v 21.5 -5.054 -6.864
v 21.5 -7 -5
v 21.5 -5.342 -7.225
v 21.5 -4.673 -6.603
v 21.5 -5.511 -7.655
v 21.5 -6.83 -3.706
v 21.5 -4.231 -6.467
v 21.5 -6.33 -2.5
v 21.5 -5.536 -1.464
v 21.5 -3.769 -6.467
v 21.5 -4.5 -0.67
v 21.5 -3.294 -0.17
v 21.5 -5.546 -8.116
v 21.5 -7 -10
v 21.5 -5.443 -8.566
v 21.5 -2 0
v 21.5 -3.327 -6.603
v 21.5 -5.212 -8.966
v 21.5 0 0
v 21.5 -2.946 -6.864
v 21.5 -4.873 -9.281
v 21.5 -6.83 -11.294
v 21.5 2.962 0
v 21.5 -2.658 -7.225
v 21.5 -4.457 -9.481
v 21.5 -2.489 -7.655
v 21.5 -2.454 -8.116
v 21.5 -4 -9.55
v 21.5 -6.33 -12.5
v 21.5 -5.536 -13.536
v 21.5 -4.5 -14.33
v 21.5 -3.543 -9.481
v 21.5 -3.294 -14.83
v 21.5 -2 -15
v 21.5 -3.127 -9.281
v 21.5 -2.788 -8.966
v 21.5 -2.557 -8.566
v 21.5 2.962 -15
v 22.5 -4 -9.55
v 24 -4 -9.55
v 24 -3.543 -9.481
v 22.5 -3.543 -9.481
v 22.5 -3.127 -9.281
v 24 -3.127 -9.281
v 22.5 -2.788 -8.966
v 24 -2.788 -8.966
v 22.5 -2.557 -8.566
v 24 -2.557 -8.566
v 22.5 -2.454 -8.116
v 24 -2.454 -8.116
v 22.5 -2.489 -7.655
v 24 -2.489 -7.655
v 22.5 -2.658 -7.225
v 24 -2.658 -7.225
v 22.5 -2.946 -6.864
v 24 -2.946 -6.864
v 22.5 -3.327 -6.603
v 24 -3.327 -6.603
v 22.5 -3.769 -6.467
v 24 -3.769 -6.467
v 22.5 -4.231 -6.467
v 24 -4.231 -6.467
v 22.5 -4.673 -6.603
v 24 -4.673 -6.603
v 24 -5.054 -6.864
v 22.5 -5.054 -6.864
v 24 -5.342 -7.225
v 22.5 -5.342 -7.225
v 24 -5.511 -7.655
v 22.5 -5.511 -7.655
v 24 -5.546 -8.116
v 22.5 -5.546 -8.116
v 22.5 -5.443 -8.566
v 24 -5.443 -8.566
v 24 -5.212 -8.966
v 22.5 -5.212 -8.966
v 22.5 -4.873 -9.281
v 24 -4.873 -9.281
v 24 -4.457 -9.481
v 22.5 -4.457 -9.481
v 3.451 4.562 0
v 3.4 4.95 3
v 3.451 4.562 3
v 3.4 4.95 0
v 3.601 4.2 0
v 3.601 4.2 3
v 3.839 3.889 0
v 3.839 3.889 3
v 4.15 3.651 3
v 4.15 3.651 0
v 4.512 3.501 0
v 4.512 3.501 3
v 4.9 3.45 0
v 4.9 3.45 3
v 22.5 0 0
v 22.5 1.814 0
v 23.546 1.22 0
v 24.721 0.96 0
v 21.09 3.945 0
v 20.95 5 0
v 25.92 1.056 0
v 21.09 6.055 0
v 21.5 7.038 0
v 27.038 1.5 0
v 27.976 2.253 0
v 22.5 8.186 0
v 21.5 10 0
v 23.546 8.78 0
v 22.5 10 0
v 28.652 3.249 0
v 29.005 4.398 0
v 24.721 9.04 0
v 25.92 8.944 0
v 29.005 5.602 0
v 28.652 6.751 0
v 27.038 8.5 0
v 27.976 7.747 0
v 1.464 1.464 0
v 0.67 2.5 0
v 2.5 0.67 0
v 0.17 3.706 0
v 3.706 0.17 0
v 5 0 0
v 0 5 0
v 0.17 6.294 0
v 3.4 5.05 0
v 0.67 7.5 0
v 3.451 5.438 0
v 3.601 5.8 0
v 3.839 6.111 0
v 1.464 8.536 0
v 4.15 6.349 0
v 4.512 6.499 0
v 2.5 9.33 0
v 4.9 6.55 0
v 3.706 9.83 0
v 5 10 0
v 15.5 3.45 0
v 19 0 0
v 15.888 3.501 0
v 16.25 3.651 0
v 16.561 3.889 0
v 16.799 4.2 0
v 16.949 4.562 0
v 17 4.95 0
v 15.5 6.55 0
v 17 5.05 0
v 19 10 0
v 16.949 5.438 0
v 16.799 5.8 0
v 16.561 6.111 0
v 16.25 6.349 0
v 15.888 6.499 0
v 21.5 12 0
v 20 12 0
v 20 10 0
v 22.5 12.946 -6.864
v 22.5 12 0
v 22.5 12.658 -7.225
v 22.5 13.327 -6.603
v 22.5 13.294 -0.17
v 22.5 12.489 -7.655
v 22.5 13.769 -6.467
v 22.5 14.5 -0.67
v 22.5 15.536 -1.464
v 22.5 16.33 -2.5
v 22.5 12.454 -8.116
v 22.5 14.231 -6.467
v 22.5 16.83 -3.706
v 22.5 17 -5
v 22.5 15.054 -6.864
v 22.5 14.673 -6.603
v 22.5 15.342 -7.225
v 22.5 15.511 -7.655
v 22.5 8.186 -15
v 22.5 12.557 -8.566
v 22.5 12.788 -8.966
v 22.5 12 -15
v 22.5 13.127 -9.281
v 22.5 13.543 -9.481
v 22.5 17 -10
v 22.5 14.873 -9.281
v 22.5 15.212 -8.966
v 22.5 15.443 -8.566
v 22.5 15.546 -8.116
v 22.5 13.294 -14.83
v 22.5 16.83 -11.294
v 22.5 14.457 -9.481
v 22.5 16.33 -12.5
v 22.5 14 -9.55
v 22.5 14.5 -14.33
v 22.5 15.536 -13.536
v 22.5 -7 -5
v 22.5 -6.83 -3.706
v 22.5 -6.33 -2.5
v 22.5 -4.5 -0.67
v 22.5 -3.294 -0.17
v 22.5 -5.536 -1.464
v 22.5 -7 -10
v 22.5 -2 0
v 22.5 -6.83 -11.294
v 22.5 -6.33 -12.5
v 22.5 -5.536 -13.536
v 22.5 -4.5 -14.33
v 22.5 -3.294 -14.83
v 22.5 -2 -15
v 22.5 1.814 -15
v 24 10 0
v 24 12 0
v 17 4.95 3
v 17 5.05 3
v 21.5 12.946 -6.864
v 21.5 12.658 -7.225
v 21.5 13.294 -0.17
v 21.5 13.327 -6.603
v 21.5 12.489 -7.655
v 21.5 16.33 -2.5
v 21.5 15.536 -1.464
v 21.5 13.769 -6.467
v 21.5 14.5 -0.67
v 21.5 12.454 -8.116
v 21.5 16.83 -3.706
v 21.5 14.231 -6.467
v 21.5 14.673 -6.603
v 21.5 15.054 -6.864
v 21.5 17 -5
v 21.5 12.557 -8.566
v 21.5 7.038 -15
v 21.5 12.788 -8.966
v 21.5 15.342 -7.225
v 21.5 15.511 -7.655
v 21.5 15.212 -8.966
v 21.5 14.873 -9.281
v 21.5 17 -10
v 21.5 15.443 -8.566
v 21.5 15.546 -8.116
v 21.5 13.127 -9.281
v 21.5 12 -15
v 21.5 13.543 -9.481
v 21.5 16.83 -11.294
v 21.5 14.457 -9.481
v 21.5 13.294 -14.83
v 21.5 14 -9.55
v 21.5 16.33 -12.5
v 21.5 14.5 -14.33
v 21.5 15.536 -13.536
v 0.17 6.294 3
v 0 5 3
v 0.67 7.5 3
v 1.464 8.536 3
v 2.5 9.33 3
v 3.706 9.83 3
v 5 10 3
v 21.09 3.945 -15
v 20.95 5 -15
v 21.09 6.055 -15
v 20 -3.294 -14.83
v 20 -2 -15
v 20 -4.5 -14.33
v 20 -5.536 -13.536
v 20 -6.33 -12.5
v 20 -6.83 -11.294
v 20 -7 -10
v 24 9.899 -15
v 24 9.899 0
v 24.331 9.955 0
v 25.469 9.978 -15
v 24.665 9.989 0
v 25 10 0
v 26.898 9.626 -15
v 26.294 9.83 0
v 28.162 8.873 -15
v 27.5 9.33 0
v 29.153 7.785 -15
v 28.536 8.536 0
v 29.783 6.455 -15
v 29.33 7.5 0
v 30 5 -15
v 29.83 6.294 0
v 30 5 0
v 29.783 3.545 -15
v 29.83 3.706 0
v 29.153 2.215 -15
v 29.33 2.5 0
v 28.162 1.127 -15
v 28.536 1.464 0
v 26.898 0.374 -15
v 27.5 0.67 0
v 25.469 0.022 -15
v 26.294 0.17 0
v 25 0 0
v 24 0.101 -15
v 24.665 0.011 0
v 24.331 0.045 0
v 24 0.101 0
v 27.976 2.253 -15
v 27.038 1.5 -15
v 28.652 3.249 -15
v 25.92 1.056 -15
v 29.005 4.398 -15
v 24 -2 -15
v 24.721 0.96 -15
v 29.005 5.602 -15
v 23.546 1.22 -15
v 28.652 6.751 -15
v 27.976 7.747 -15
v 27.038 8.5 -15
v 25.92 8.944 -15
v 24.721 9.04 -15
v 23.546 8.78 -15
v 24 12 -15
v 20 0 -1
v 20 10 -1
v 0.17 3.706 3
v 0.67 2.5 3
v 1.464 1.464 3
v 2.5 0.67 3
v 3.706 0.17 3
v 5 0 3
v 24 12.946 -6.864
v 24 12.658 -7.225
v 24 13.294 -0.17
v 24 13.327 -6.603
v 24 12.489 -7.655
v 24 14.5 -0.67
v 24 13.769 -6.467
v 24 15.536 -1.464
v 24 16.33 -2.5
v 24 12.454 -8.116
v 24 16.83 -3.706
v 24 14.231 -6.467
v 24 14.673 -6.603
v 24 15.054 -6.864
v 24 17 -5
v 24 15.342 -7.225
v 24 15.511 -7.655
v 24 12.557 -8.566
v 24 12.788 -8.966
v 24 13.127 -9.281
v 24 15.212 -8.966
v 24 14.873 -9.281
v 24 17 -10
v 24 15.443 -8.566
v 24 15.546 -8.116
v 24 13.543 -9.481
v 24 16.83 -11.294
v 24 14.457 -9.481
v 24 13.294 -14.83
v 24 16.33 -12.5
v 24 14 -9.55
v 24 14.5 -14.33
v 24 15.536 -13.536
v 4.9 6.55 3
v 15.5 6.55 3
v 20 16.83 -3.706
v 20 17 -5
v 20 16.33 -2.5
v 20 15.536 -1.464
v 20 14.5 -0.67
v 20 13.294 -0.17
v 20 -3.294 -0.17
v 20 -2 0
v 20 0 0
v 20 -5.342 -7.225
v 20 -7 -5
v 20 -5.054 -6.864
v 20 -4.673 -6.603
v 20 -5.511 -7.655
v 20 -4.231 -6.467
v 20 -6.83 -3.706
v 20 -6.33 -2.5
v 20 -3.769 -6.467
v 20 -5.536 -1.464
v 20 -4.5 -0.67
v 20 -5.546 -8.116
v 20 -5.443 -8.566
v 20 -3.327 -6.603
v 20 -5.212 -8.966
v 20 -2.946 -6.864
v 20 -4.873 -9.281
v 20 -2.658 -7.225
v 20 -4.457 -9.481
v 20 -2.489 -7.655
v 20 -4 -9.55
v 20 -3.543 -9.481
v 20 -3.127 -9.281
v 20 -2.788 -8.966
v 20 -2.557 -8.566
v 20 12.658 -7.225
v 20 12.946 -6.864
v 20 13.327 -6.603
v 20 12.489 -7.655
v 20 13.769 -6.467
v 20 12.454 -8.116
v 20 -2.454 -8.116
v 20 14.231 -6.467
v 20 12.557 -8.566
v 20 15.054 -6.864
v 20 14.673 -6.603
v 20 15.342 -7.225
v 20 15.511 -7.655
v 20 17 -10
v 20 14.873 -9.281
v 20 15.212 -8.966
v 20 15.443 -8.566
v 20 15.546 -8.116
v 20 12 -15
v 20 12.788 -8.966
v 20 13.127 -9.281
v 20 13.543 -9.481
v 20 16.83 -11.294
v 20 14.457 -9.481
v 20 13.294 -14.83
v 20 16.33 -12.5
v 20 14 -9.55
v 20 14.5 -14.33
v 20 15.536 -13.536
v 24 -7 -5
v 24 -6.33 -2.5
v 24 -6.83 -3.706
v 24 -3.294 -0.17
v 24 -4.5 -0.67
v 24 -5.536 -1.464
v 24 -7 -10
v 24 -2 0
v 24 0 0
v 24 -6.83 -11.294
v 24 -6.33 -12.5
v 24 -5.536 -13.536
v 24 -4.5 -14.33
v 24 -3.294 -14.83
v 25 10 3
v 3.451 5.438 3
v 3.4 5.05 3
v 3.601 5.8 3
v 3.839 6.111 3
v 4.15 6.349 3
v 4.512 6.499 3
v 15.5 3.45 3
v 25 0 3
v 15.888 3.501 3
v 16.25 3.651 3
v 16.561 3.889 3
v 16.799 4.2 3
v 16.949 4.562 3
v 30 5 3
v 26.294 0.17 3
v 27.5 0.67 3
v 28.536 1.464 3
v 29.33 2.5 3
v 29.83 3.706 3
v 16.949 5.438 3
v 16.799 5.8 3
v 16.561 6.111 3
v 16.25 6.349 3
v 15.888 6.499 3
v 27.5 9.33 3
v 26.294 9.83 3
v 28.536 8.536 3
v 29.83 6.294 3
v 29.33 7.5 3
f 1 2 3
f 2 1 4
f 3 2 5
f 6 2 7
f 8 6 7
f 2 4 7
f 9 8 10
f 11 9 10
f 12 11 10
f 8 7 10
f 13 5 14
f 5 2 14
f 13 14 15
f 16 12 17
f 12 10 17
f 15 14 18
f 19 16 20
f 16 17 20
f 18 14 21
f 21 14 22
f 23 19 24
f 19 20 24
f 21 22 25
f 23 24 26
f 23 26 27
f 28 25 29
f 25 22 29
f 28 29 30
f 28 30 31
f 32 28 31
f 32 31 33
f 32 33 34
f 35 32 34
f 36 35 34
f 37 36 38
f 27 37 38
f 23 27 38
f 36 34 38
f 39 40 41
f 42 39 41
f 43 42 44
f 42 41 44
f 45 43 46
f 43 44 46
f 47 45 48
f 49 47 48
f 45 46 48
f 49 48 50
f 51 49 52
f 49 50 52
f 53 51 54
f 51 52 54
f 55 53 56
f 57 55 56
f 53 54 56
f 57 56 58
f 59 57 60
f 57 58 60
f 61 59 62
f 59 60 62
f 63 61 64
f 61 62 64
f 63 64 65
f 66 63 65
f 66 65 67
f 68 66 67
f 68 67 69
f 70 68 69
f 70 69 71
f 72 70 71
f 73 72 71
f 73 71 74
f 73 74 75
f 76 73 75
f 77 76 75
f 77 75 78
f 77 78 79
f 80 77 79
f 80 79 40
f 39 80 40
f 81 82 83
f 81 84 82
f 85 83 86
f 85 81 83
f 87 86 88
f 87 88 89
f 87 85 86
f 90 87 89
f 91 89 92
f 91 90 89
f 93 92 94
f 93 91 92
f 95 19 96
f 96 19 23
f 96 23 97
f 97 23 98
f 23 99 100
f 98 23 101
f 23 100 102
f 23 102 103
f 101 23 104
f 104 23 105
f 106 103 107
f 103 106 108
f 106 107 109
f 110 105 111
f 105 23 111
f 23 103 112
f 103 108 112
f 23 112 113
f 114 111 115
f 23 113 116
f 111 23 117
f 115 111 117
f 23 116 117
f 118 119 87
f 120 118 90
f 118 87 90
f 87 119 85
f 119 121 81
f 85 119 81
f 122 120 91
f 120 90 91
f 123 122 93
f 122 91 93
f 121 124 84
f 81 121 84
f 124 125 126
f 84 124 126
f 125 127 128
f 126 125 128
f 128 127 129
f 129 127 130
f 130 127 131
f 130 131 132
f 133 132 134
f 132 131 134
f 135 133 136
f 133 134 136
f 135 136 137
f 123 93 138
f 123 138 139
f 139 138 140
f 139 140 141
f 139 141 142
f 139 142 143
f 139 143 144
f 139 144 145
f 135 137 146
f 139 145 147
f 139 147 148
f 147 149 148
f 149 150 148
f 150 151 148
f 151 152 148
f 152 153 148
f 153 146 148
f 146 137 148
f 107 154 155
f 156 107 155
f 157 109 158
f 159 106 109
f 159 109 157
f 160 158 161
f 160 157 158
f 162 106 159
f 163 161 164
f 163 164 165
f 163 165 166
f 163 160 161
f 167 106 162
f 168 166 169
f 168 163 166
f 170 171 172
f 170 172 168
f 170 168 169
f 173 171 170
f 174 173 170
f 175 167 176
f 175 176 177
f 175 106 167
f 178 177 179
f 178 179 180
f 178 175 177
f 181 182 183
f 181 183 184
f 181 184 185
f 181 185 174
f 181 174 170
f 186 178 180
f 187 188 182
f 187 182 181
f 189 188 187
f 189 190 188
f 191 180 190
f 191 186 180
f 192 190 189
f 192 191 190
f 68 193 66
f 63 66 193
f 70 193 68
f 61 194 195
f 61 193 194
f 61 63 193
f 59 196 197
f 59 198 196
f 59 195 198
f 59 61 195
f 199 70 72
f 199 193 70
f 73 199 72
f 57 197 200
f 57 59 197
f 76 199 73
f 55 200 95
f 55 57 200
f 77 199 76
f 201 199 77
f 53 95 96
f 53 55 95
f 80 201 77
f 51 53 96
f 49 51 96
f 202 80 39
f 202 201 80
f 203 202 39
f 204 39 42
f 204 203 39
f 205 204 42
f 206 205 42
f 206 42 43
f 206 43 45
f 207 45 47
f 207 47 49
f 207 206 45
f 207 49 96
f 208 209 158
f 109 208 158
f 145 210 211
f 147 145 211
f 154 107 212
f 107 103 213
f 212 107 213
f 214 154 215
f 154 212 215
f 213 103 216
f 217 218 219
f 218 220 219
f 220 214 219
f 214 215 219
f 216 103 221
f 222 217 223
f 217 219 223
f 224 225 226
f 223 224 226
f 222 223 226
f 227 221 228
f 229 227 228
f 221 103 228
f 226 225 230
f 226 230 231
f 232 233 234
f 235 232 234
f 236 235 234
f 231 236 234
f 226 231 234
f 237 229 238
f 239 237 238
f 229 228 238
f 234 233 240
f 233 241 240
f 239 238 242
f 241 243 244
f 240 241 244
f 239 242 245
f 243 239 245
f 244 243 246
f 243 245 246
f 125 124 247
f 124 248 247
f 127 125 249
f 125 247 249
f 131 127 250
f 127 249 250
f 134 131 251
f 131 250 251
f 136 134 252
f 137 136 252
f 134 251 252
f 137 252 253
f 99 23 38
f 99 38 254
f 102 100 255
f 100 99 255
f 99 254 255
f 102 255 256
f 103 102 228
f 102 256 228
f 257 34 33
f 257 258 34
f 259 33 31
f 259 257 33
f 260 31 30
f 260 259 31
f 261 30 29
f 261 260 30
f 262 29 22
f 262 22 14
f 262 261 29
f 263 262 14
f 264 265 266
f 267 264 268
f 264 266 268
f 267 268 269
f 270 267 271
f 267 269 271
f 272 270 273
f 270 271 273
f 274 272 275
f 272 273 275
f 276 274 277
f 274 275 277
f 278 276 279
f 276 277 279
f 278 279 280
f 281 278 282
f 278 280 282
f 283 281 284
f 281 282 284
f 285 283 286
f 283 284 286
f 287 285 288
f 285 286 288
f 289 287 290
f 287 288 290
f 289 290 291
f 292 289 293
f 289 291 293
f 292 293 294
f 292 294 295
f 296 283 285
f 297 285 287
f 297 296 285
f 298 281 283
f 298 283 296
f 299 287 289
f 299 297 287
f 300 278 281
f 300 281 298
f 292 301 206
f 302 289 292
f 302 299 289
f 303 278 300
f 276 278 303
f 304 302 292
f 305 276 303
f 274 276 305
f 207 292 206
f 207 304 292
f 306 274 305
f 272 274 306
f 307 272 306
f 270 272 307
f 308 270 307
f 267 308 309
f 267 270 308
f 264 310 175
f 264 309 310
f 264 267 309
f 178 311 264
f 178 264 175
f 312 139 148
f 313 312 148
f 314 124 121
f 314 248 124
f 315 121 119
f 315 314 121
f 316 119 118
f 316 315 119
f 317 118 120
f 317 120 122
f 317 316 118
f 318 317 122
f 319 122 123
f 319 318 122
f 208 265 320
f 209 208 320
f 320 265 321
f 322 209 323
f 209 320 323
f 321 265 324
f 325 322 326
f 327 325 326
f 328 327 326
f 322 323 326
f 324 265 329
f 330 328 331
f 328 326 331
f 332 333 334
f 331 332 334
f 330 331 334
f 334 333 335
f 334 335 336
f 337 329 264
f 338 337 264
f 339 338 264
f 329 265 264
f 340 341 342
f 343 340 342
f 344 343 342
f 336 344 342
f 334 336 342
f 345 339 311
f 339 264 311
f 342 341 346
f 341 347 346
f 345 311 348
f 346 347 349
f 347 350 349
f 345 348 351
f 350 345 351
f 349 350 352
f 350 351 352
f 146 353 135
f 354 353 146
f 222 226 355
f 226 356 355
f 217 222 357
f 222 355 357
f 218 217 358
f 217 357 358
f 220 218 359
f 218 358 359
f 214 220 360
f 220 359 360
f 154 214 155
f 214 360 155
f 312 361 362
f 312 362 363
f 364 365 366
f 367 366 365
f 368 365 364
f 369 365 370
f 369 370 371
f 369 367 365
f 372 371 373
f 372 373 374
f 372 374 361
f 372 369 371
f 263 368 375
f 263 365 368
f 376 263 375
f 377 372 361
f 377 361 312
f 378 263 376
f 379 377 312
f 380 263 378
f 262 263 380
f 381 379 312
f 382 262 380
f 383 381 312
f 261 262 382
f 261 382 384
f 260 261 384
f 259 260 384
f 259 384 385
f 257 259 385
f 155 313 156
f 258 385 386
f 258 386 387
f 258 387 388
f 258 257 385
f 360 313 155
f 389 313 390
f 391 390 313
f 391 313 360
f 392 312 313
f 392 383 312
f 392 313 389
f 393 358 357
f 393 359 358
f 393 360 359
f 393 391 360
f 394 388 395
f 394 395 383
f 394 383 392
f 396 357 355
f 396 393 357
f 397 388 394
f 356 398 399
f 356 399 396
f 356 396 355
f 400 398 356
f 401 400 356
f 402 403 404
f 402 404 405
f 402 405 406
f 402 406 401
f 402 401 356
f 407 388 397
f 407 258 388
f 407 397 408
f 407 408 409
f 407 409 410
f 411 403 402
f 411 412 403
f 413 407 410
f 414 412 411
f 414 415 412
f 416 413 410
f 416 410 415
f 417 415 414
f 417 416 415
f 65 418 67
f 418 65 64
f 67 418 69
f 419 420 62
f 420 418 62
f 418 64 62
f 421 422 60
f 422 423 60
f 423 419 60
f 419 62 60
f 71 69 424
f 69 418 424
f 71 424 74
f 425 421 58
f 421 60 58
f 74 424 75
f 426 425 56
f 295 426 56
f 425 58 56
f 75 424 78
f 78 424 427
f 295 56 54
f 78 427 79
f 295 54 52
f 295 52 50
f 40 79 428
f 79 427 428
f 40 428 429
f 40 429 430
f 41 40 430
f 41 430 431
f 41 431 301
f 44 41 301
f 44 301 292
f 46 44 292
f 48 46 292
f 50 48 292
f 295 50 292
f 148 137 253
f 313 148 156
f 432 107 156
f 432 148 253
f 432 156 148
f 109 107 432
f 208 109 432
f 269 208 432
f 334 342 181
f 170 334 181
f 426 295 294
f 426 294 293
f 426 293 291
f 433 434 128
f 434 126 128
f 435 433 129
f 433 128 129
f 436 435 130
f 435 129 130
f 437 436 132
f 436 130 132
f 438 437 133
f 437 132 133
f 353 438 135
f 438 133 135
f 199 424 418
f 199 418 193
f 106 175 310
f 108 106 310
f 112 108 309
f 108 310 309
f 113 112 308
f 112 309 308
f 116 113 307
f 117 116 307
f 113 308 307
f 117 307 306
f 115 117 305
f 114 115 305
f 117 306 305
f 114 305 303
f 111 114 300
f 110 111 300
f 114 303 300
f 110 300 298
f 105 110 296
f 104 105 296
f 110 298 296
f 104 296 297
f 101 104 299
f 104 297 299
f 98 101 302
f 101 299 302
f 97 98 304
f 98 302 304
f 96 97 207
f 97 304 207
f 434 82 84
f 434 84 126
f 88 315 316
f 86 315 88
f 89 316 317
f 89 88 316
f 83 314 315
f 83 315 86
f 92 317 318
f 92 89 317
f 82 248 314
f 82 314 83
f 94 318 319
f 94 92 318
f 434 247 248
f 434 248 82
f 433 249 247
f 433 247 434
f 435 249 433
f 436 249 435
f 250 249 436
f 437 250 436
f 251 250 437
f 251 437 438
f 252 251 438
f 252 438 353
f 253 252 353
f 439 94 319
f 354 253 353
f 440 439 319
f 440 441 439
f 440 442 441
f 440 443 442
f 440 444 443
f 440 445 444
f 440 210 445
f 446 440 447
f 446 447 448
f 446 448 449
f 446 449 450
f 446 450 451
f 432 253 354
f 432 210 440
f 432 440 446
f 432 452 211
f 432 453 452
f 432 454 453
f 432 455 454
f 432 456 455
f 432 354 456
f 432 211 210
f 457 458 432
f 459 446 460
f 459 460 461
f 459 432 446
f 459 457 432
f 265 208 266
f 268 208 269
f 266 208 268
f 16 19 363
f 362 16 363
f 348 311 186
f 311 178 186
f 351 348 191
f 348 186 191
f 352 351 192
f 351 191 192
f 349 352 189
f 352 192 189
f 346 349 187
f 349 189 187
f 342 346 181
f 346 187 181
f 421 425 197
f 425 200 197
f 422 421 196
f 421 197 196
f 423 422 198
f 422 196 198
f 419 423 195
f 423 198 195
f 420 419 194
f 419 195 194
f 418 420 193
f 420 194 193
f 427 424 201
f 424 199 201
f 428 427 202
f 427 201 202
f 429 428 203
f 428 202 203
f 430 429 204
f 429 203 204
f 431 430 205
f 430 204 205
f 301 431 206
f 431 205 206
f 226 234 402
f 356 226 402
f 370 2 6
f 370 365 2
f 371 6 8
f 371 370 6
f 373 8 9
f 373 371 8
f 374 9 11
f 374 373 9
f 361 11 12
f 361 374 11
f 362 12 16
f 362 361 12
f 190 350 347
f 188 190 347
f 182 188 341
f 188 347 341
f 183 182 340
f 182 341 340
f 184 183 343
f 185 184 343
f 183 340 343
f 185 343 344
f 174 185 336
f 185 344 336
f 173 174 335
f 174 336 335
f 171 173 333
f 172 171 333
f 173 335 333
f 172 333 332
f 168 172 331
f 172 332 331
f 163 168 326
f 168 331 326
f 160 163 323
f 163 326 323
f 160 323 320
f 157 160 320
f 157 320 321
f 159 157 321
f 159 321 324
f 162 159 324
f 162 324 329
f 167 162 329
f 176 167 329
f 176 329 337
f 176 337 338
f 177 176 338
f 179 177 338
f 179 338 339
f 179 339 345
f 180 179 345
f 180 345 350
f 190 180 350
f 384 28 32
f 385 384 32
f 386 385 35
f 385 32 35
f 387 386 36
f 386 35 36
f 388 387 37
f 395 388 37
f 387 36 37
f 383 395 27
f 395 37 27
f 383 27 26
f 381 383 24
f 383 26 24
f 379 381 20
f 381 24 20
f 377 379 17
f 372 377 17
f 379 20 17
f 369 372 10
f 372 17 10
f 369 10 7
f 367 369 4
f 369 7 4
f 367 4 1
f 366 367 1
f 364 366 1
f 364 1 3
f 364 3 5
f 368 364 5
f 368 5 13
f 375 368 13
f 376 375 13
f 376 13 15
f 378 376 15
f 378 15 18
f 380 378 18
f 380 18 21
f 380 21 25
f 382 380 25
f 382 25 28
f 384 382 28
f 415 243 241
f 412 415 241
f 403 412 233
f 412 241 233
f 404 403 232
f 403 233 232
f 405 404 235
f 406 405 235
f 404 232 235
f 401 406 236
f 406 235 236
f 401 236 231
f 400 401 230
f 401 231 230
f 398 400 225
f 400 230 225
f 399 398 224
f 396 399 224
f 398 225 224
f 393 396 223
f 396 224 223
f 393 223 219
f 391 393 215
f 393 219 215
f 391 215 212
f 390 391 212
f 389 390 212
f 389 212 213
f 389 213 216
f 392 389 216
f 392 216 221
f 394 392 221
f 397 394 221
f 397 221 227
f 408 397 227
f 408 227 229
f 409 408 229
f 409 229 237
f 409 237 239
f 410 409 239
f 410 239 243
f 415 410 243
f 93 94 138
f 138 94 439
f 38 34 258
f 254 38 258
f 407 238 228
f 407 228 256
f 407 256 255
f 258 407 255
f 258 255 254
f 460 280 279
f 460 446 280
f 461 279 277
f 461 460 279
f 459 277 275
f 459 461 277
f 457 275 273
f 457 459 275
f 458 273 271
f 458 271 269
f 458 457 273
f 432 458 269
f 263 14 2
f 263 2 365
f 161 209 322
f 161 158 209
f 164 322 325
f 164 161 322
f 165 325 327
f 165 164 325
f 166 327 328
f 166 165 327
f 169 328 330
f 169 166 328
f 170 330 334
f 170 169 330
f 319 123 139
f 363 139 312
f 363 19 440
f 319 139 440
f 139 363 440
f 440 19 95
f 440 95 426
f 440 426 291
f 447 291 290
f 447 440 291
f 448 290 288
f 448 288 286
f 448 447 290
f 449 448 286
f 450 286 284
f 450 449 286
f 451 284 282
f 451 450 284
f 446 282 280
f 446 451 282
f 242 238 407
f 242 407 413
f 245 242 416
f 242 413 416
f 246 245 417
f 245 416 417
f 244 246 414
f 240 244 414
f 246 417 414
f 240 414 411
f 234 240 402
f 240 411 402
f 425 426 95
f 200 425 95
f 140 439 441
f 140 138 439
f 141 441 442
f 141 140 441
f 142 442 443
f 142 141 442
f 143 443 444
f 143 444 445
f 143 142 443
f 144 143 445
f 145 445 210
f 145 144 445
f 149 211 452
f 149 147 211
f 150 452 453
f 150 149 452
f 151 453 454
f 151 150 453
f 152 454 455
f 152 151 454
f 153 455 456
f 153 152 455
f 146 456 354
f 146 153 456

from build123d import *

# Parameters (mm, degrees)
SZKIC1_W                    = 30
SZKIC1_H                    = 10
DODANIE_WYCI_GNI_CIE1_DEPTH = 3
ZAOKR_GLENIE1_R             = 5
WYTNIJ_WYCI_GNI_CIE1_REACH  = 33.765
SZKIC2_W                    = 13.6
SZKIC2_H                    = 3.1
ZAOKR_GLENIE2_R             = 1.5
SZKIC3_R                    = 5
DODANIE_WYCI_GNI_CIE2_DEPTH = 15
SZKIC5_W                    = 1.5
SZKIC5_H                    = 24
DODANIE_WYCI_GNI_CIE3_DEPTH = 15
SZKIC4_R                    = 4.05
WYTNIJ_WYCI_GNI_CIE2_DEPTH  = 15
SZKIC6_W                    = 1
SZKIC6_H                    = 10.631374676
WYTNIJ_WYCI_GNI_CIE3_DEPTH  = 15
SZKIC7_R                    = 1.55
WYTNIJ_WYCI_GNI_CIE4_DEPTH  = 34.015148038
ZAOKR_GLENIE3_R             = 5
SFAZOWANIE1_SIZE            = 1


with BuildPart() as part:
    # Szkic1 → Dodanie-wyciągnięcie1 (new body)
    with BuildSketch(Plane.XY):
        with Locations((15, 5)):
            Rectangle(SZKIC1_W, SZKIC1_H)
    extrude(amount=DODANIE_WYCI_GNI_CIE1_DEPTH)

    # Zaokrąglenie1
    zaokr_glenie1_edges = [part.edges().sort_by_distance(p)[0] for p in [
        (0, 10, 1.5),
        (0, 0, 1.5),
        (30, 10, 1.5),
        (30, 0, 1.5),
    ]]
    fillet(zaokr_glenie1_edges, radius=ZAOKR_GLENIE1_R - 0.0001)  # a hair under: the kernel refuses the full size

    # Szkic2 → Wytnij-wyciągnięcie1 (cut, up to next)
    with BuildSketch(Plane.XY.offset(3), mode=Mode.PRIVATE) as wytnij_wyci_gni_cie1_sk1:
        with Locations((10.2, 5)):
            Rectangle(SZKIC2_W, SZKIC2_H)
    wytnij_wyci_gni_cie1_tool1 = extrude(wytnij_wyci_gni_cie1_sk1.sketch, amount=-WYTNIJ_WYCI_GNI_CIE1_REACH, mode=Mode.PRIVATE) & part.part
    add(wytnij_wyci_gni_cie1_tool1.solids().sort_by_distance((10.2, 5, 3))[0], mode=Mode.SUBTRACT)

    # Zaokrąglenie2
    zaokr_glenie2_edges = [part.edges().sort_by_distance(p)[0] for p in [
        (3.4, 3.45, 1.5),
        (3.4, 6.55, 1.5),
        (17, 6.55, 1.5),
        (17, 3.45, 1.5),
    ]]
    fillet(zaokr_glenie2_edges, radius=ZAOKR_GLENIE2_R)

    # Szkic3 → Dodanie-wyciągnięcie2 (add)
    with BuildSketch(Plane(origin=(0, 0, 0), x_dir=(-1, 0, 0), z_dir=(0, 0, -1))):
        with Locations((-25, 5)):
            Circle(SZKIC3_R)
    extrude(amount=DODANIE_WYCI_GNI_CIE2_DEPTH)

    # Szkic5 → Dodanie-wyciągnięcie3 (add)
    with BuildSketch(Plane(origin=(0, 0, -15), x_dir=(-1, 0, 0), z_dir=(0, 0, -1))):
        with Locations((-20.75, 5)):
            Rectangle(SZKIC5_W, SZKIC5_H)
        with Locations((-23.25, 5)):
            Rectangle(SZKIC5_W, SZKIC5_H)
    extrude(amount=-DODANIE_WYCI_GNI_CIE3_DEPTH)

    # Szkic4 → Wytnij-wyciągnięcie2 (cut)
    with BuildSketch(Plane(origin=(0, 0, -15), x_dir=(-1, 0, 0), z_dir=(0, 0, -1))):
        with Locations((-25, 5)):
            Circle(SZKIC4_R)
    extrude(amount=-WYTNIJ_WYCI_GNI_CIE2_DEPTH, mode=Mode.SUBTRACT)

    # Szkic6 → Wytnij-wyciągnięcie3 (cut)
    with BuildSketch(Plane(origin=(0, 0, -15), x_dir=(-1, 0, 0), z_dir=(0, 0, -1))):
        with Locations((-22, 4.629389041)):
            Rectangle(SZKIC6_W, SZKIC6_H)
    extrude(amount=-WYTNIJ_WYCI_GNI_CIE3_DEPTH, mode=Mode.SUBTRACT)

    # Szkic7 → Wytnij-wyciągnięcie4 (cut, through all)
    with BuildSketch(Plane(origin=(24, 0, 0), x_dir=(0, 0, -1), z_dir=(1, 0, 0))):
        with Locations((8, -4)):
            Circle(SZKIC7_R)
        with Locations((8, 14)):
            Circle(SZKIC7_R)
    extrude(amount=-WYTNIJ_WYCI_GNI_CIE4_DEPTH, mode=Mode.SUBTRACT)

    # Zaokrąglenie3
    zaokr_glenie3_edges = [part.edges().sort_by_distance(p)[0] for p in [
        (23.25, -7, -15),
        (23.25, -7, 0),
        (23.25, 17, 0),
        (23.25, 17, -15),
        (20.75, -7, -15),
        (20.75, -7, 0),
        (20.75, 17, 0),
        (20.75, 17, -15),
    ]]
    fillet(zaokr_glenie3_edges, radius=ZAOKR_GLENIE3_R)

    # Sfazowanie1
    sfazowanie1_edges = [part.edges().sort_by_distance(p)[0] for p in [
        (20, 5, 0),
    ]]
    chamfer(sfazowanie1_edges, length=SFAZOWANIE1_SIZE)


solid = part.part
